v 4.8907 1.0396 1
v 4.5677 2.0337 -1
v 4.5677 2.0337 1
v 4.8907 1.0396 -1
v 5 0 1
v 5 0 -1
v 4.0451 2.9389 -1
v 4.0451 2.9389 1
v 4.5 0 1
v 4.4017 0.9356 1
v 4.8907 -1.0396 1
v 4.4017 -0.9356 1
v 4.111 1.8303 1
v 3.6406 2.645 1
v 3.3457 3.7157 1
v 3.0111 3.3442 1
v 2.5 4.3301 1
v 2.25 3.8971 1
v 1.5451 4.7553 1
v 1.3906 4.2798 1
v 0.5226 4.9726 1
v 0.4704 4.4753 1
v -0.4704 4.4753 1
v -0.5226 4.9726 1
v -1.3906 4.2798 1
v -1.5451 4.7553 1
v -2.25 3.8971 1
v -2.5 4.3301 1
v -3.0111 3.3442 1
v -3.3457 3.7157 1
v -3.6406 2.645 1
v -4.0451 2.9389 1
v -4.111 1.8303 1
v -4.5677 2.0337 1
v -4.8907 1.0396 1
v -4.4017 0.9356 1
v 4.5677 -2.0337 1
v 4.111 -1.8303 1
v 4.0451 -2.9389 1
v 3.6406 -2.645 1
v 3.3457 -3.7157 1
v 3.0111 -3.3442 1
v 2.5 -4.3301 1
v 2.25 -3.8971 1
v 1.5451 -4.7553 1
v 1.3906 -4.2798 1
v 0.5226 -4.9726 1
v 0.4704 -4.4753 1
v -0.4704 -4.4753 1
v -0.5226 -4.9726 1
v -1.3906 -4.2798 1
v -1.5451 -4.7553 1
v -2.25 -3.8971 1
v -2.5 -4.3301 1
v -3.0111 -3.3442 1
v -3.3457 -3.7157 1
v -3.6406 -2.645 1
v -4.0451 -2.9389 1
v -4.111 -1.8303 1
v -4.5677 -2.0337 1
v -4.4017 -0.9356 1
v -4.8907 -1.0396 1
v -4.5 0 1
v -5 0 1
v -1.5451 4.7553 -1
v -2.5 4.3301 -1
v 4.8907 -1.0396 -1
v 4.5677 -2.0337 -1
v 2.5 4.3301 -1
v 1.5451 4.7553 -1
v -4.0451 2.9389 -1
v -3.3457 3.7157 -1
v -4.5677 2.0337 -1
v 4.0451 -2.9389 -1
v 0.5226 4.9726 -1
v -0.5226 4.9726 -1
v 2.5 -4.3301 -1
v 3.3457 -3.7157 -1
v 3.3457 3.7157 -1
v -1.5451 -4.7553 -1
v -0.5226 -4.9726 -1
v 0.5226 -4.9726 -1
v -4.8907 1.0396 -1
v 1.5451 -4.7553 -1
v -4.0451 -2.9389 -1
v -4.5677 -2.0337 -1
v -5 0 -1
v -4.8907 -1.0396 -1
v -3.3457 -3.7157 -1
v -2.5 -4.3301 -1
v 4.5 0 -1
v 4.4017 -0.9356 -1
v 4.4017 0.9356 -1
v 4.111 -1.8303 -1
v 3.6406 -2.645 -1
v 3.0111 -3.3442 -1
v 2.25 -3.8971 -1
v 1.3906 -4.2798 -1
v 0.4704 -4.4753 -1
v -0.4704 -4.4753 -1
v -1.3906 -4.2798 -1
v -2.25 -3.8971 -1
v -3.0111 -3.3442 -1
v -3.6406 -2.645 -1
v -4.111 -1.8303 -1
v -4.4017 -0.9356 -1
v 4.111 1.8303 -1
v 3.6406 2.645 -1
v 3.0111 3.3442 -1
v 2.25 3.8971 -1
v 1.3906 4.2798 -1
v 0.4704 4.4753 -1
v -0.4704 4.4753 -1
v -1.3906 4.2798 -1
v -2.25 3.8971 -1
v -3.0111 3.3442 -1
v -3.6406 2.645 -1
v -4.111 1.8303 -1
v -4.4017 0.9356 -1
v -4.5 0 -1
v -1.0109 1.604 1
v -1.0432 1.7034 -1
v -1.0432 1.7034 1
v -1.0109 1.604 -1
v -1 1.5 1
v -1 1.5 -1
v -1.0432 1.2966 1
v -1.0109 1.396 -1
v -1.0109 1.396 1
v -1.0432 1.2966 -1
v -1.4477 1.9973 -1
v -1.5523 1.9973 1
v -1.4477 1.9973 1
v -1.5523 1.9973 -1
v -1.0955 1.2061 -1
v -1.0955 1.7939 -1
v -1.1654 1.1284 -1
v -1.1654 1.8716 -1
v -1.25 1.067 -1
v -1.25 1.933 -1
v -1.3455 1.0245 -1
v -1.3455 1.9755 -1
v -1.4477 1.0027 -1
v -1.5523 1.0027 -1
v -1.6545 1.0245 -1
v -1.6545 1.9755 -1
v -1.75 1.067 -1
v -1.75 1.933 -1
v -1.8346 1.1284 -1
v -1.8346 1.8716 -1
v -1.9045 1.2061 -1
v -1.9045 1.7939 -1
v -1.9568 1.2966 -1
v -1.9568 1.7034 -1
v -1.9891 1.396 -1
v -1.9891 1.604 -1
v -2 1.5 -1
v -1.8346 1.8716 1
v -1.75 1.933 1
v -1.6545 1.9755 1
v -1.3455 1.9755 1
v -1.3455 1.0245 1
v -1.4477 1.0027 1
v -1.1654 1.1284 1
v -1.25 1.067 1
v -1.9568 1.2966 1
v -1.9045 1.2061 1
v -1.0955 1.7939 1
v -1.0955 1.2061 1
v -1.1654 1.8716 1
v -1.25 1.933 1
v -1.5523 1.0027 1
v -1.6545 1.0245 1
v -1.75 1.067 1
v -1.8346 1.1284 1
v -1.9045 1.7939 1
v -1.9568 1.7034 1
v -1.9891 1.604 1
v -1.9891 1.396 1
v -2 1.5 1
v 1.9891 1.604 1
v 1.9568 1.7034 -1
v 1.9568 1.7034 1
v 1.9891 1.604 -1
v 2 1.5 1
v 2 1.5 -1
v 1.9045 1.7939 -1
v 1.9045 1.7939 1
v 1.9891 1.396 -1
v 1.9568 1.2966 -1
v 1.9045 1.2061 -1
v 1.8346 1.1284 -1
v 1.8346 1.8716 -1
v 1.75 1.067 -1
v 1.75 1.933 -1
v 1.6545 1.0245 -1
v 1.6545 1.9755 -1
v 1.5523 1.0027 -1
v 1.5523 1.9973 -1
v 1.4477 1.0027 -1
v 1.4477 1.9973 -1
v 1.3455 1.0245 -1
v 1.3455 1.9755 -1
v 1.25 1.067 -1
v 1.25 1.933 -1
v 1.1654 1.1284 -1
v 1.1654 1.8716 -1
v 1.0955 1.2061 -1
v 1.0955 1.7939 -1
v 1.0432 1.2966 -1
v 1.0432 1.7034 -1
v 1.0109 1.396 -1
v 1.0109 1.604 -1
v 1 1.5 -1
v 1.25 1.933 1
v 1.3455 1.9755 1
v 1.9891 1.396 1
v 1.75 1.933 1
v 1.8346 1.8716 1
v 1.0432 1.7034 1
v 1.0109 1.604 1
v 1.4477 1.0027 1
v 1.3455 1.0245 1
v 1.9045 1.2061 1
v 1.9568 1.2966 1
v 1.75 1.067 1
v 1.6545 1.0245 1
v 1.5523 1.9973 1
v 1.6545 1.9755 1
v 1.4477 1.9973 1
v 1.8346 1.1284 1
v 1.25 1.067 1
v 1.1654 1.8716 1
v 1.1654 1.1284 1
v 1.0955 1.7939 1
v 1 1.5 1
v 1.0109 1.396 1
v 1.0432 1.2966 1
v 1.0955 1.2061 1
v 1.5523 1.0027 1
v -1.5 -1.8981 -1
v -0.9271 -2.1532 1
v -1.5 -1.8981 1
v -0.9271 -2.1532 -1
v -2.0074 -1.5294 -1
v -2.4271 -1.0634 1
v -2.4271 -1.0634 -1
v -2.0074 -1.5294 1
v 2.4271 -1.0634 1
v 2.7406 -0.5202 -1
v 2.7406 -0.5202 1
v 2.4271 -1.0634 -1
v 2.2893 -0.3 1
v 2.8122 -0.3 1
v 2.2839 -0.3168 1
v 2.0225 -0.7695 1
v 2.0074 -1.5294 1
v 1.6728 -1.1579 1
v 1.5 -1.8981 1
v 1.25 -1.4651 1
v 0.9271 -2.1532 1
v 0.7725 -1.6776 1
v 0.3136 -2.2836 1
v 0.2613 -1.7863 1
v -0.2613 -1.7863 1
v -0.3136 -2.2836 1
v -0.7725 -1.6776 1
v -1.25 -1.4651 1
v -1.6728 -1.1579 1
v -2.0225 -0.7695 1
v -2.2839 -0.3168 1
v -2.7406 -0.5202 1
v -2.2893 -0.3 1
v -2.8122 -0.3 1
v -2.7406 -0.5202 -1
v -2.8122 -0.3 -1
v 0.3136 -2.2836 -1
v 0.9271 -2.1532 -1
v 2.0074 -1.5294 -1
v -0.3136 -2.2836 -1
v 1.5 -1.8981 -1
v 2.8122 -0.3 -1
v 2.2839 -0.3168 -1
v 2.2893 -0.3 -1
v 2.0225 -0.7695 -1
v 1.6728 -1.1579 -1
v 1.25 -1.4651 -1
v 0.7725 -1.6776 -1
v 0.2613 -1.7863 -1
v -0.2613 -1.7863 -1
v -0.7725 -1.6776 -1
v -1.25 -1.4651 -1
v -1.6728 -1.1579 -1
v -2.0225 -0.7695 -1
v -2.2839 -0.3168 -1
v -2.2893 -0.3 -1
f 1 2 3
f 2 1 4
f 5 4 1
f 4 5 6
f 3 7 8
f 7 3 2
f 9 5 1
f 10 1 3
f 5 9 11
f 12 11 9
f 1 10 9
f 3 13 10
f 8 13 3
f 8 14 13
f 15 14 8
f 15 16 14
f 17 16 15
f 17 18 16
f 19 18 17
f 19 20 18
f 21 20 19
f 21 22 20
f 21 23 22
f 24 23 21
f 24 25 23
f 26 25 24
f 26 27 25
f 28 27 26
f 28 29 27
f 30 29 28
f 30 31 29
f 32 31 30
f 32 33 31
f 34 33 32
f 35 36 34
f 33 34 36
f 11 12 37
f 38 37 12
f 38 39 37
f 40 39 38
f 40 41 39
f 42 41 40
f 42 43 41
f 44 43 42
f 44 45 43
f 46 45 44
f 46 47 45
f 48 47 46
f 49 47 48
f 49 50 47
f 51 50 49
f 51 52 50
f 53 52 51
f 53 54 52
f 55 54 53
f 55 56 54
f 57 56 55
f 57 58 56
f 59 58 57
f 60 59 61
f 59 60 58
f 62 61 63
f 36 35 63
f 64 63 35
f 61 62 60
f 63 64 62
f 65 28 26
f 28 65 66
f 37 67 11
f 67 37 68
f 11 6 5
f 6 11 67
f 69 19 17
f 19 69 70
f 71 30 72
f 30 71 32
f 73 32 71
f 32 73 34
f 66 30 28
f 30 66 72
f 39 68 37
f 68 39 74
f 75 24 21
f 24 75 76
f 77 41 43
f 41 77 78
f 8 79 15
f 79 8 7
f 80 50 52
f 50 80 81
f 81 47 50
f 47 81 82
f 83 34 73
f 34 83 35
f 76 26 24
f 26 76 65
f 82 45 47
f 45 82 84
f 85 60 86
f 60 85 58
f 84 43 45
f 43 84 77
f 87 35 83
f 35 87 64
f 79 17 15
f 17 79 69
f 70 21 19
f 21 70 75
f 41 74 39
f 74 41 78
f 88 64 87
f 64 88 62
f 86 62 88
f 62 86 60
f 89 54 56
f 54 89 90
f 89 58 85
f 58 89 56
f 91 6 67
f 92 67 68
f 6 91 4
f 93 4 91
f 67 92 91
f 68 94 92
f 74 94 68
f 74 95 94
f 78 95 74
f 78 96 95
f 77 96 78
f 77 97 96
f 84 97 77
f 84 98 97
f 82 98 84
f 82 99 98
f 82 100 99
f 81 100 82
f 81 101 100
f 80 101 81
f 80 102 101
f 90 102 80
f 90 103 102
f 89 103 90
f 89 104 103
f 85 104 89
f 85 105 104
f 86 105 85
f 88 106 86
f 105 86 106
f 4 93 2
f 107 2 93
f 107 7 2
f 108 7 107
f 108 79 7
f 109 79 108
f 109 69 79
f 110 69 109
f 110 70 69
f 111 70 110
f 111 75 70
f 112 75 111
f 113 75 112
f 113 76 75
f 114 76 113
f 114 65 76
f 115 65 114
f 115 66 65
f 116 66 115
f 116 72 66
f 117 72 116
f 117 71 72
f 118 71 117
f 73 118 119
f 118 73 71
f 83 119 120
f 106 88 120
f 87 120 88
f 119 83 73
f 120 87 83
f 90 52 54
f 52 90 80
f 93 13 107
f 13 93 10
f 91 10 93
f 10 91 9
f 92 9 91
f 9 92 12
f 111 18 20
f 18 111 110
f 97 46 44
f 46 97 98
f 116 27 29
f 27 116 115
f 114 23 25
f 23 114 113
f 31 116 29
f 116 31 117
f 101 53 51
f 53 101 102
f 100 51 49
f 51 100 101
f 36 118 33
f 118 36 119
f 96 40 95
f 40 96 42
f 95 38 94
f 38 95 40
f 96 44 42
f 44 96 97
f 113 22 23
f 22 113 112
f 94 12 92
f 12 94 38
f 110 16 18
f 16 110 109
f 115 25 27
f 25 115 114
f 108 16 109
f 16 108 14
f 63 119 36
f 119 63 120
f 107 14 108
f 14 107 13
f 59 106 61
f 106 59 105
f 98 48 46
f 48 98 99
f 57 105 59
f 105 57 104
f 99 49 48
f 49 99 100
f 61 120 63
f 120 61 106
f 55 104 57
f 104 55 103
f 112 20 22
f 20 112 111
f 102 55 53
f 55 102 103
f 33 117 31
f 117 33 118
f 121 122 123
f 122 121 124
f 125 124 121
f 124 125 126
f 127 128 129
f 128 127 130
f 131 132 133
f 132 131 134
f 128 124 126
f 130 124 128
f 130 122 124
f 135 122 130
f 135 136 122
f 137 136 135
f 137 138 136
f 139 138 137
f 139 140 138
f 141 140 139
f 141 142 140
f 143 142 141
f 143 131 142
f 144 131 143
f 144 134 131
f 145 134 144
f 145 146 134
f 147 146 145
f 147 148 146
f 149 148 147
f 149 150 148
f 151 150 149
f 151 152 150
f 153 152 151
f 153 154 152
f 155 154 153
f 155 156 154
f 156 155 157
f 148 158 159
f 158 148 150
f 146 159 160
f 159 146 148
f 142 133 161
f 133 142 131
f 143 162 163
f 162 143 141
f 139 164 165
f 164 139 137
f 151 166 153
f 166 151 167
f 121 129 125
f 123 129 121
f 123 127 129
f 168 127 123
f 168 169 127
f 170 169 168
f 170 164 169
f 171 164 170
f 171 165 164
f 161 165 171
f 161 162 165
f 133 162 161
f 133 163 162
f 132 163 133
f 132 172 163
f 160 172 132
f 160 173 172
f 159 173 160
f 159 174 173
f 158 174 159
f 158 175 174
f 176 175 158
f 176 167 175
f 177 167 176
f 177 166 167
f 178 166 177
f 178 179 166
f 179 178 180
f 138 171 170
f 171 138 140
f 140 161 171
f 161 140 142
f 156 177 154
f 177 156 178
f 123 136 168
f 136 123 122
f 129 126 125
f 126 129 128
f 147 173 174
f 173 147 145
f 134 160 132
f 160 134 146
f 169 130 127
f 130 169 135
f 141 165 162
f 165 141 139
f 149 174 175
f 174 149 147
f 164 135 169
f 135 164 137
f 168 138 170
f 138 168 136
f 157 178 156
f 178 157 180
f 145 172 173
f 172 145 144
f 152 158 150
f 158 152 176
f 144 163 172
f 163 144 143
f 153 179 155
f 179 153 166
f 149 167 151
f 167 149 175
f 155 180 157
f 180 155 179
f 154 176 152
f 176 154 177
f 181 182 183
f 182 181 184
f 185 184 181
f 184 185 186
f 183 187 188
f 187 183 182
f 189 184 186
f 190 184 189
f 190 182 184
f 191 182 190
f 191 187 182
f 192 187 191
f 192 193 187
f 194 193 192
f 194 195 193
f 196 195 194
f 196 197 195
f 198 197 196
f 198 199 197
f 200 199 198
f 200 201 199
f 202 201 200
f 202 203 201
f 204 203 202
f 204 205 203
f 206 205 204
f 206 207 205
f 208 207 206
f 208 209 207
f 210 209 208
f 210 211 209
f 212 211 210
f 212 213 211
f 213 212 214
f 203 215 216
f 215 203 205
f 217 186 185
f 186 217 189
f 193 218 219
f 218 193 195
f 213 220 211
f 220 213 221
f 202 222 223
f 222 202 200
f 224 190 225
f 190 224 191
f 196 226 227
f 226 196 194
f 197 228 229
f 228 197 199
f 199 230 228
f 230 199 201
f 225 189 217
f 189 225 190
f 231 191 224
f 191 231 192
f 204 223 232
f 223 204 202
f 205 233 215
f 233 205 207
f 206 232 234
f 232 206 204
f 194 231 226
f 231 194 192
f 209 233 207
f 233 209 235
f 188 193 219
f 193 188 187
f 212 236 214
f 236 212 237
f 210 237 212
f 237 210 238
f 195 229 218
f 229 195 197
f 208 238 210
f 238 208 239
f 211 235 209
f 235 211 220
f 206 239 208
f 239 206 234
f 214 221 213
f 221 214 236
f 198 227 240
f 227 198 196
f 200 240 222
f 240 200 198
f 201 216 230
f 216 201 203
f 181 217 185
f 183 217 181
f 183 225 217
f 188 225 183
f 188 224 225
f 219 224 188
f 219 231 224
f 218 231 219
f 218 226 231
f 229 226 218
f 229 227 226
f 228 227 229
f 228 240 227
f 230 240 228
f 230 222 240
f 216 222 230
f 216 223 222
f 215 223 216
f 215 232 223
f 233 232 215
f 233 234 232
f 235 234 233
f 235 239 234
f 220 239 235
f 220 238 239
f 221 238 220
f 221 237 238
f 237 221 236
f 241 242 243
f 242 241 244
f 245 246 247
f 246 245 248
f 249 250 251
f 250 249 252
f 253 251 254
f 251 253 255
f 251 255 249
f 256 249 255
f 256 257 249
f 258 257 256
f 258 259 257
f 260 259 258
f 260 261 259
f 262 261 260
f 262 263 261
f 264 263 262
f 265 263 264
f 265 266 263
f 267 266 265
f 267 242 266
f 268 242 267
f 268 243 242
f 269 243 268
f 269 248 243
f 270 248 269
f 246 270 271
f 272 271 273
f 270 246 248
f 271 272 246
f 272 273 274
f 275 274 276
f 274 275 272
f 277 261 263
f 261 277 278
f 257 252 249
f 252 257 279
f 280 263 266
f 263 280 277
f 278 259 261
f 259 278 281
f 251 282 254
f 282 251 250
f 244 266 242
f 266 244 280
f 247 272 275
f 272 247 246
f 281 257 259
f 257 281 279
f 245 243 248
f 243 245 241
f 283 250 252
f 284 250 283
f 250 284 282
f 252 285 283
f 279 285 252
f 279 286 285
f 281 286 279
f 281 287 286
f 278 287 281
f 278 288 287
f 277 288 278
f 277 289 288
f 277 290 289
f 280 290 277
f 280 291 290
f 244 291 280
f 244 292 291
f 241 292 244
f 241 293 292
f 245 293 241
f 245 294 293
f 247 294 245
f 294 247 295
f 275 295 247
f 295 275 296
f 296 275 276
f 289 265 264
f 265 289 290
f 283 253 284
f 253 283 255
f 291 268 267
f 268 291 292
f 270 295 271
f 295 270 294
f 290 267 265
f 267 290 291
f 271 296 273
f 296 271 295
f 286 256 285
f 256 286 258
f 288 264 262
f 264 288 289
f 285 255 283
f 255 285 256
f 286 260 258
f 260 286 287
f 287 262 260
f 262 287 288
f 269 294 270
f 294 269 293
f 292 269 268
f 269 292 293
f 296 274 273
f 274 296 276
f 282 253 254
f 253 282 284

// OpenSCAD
sfn=30;




difference() {
    cylinder(r=5, h=2, $fn=sfn, center=true);
    cylinder(r=4.5, h=5, $fn=sfn, center=true);
}

for(i = [-1, 1]) {
    translate([1.5*i,1.5,0])cylinder(r=0.5,h=2, $fn=sfn, center=true);
}


translate([0,0.7,0]) difference() {
    cylinder(r=3, h=2, $fn=sfn, center=true);
    cylinder(r=2.5, h=5, $fn=sfn, center=true);
    translate([0,4,0]) cube([10,10,5], center=true);
}
